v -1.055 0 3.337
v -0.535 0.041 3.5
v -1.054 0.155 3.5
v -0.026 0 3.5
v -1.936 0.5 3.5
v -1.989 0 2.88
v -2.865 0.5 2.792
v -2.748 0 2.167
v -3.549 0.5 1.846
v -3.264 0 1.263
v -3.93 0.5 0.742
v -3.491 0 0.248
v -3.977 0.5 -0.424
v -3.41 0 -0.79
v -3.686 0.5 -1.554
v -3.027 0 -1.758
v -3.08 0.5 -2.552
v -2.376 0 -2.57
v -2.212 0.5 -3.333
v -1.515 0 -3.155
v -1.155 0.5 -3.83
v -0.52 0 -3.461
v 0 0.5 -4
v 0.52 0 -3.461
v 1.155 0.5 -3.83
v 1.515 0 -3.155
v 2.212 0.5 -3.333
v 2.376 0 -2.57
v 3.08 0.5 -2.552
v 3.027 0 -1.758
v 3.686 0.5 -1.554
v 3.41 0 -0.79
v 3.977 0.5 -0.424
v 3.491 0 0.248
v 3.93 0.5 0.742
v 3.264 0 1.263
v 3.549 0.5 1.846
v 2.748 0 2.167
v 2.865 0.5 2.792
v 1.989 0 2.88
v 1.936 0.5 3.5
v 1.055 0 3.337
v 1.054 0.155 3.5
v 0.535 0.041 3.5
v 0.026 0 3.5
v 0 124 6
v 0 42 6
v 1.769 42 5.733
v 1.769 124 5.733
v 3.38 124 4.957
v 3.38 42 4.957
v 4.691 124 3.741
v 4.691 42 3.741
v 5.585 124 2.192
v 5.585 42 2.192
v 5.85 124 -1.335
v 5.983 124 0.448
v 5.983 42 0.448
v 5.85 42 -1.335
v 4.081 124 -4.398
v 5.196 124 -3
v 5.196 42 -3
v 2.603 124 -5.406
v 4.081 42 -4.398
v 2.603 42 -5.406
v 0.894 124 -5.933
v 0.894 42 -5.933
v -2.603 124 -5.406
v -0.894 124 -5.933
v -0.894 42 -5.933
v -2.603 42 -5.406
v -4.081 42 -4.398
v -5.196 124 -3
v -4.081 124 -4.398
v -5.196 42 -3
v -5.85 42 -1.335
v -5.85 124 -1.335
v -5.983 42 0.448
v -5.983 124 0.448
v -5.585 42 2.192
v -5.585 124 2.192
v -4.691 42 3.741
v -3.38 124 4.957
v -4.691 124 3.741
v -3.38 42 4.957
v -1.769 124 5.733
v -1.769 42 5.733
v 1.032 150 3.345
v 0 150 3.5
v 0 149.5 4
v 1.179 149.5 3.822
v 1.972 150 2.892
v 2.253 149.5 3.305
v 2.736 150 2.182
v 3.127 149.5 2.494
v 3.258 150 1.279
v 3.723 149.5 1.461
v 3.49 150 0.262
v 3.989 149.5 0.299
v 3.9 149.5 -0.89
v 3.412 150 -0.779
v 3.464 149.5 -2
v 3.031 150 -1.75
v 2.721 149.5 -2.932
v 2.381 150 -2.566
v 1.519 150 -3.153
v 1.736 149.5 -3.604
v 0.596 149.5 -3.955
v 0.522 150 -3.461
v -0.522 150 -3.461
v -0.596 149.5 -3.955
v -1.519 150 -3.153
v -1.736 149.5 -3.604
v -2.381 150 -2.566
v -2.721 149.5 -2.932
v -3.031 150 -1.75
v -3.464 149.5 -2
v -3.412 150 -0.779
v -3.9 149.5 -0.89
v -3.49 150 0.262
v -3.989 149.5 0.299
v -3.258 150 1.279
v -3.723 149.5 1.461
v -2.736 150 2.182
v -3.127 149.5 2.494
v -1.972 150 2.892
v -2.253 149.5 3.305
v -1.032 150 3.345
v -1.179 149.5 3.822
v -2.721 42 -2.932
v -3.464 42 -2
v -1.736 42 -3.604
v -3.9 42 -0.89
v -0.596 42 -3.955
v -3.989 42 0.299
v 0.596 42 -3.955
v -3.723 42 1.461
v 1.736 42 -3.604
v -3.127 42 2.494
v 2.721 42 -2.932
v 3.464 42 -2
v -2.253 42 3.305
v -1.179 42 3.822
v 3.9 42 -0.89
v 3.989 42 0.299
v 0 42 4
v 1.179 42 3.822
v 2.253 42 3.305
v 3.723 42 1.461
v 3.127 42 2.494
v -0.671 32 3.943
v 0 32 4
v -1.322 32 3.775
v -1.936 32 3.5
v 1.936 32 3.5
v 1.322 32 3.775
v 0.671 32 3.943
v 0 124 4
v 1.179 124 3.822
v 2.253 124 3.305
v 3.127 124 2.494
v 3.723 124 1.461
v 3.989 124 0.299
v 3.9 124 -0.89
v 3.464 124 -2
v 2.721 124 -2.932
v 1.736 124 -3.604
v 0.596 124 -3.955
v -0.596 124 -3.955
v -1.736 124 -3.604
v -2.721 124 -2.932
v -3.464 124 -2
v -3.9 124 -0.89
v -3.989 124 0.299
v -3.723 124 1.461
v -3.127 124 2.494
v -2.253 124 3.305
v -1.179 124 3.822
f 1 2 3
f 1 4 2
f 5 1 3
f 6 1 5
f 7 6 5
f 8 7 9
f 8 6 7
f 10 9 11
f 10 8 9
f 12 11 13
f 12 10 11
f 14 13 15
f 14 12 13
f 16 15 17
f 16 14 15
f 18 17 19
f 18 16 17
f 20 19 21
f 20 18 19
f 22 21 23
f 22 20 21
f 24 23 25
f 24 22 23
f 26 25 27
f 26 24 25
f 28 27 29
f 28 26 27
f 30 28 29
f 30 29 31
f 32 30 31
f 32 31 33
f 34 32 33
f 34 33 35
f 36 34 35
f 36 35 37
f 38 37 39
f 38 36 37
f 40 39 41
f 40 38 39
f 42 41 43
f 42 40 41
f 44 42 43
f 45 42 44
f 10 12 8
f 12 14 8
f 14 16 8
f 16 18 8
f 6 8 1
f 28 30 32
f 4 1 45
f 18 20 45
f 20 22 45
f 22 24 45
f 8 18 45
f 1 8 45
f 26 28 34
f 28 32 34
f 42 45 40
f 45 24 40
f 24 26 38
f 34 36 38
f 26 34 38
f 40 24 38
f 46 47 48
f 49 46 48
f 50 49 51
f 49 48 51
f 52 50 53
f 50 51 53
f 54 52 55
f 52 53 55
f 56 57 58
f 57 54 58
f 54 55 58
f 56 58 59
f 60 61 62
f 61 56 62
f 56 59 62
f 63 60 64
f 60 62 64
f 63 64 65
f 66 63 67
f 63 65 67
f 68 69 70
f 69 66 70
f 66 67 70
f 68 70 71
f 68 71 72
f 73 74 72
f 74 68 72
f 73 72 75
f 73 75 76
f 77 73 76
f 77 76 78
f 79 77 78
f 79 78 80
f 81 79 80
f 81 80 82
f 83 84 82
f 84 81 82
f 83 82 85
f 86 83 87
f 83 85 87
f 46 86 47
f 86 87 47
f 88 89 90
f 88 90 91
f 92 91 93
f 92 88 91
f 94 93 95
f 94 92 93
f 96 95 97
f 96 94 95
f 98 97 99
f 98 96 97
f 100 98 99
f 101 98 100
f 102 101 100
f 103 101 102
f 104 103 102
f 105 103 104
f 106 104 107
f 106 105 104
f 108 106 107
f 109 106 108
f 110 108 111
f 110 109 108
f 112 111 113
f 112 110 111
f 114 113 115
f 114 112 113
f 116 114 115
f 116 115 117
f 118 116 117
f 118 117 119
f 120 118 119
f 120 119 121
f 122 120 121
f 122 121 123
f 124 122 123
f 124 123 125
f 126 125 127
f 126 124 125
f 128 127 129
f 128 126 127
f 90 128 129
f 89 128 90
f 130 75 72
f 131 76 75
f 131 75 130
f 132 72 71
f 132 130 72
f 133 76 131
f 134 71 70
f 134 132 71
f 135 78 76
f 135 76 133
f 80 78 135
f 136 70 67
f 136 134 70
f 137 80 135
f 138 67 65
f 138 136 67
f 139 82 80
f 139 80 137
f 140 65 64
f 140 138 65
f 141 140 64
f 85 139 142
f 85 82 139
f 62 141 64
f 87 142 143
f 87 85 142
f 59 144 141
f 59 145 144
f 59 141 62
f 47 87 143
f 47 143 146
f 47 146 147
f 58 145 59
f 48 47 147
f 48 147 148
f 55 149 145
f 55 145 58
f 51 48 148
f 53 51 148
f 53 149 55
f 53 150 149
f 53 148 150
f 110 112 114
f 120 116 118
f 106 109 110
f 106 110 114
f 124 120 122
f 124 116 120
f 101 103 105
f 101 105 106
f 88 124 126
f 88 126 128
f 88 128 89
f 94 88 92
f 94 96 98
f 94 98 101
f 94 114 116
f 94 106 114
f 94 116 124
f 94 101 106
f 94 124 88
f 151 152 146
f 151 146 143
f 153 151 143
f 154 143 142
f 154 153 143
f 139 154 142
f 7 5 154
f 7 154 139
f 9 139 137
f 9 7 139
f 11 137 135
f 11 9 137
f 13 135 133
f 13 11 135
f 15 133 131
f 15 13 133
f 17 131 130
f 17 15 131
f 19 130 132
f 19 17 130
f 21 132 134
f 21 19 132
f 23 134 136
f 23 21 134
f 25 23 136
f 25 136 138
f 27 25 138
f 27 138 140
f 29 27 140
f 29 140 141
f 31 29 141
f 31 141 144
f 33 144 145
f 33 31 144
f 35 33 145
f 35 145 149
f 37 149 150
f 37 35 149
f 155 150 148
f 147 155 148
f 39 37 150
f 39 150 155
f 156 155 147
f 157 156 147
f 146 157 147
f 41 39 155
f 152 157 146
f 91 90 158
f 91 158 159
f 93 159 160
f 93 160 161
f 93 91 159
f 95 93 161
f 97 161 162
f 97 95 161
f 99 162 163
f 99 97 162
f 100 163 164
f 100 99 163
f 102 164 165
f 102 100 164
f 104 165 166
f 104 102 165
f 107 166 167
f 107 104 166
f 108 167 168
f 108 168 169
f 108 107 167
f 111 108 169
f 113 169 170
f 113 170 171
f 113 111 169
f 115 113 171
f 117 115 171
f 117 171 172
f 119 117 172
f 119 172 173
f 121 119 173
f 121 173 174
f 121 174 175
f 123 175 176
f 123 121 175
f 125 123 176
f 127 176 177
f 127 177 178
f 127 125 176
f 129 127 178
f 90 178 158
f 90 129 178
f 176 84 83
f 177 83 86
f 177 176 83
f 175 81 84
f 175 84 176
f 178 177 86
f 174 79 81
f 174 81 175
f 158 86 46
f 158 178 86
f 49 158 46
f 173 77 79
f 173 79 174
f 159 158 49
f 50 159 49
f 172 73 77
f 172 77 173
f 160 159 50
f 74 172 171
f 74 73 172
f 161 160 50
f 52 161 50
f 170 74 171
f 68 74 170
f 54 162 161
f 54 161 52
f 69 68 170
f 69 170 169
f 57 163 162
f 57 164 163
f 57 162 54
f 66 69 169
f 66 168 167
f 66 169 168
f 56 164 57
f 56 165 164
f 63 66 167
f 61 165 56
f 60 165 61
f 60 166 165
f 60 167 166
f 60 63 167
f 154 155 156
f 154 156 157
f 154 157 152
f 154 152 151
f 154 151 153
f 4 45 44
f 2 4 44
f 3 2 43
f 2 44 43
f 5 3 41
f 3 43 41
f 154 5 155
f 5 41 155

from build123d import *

# Parameters (mm, degrees)
SKETCH1_R           = 6
BOSS_EXTRUDE1_DEPTH = 150
SKETCH2_OUTSIDE_W   = 44.192
SKETCH2_OUTSIDE_H   = 44.192
SKETCH2_OUTSIDE_R   = 4
CUT_EXTRUDE1_DEPTH  = 26
SKETCH3_OUTSIDE_W   = 44.192
SKETCH3_OUTSIDE_H   = 44.192
SKETCH3_OUTSIDE_R   = 4
CUT_EXTRUDE2_DEPTH  = 42
SKETCH4_W           = 0.5
SKETCH4_H           = 32
CUT_EXTRUDE3_DEPTH  = 5
CHAMFER1_SIZE       = 0.5


with BuildPart() as part:
    # Sketch1 → Boss-Extrude1 (new body)
    with BuildSketch(Plane(origin=(0, 0, 0), x_dir=(1, 0, 0), z_dir=(0, 1, 0))):
        with Locations(Location((0, 0, 0), (0, 0, 270))):
            Circle(SKETCH1_R)
    extrude(amount=BOSS_EXTRUDE1_DEPTH)

    # Sketch2 outside → Cut-Extrude1 (cut)
    with BuildSketch(Plane(origin=(0, 150, 0), x_dir=(1, 0, 0), z_dir=(0, 1, 0))):
        Rectangle(SKETCH2_OUTSIDE_W, SKETCH2_OUTSIDE_H)
        with Locations(Location((0, 0, 0), (0, 0, 270))):
            Circle(SKETCH2_OUTSIDE_R, mode=Mode.SUBTRACT)
    extrude(amount=-CUT_EXTRUDE1_DEPTH, mode=Mode.SUBTRACT)

    # Sketch3 outside → Cut-Extrude2 (cut)
    with BuildSketch(Plane.XZ):
        Rectangle(SKETCH3_OUTSIDE_W, SKETCH3_OUTSIDE_H)
        with Locations(Location((0, 0, 0), (0, 0, 90))):
            Circle(SKETCH3_OUTSIDE_R, mode=Mode.SUBTRACT)
    extrude(amount=-CUT_EXTRUDE2_DEPTH, mode=Mode.SUBTRACT)

    # Sketch4 → Cut-Extrude3 (cut, symmetric)
    with BuildSketch(Plane(origin=(0, 0, 0), x_dir=(0, 0, -1), z_dir=(1, 0, 0))):
        with Locations((-3.75, 16)):
            Rectangle(SKETCH4_W, SKETCH4_H)
    extrude(amount=CUT_EXTRUDE3_DEPTH, both=True, mode=Mode.SUBTRACT)

    # Chamfer1
    chamfer1_edges = [part.edges().sort_by_distance(p)[0] for p in [
        (0, 0, -4),
        (0, 150, -4),
    ]]
    chamfer(chamfer1_edges, length=CHAMFER1_SIZE - 0.0001)  # a hair under: the kernel refuses the full size


solid = part.part
